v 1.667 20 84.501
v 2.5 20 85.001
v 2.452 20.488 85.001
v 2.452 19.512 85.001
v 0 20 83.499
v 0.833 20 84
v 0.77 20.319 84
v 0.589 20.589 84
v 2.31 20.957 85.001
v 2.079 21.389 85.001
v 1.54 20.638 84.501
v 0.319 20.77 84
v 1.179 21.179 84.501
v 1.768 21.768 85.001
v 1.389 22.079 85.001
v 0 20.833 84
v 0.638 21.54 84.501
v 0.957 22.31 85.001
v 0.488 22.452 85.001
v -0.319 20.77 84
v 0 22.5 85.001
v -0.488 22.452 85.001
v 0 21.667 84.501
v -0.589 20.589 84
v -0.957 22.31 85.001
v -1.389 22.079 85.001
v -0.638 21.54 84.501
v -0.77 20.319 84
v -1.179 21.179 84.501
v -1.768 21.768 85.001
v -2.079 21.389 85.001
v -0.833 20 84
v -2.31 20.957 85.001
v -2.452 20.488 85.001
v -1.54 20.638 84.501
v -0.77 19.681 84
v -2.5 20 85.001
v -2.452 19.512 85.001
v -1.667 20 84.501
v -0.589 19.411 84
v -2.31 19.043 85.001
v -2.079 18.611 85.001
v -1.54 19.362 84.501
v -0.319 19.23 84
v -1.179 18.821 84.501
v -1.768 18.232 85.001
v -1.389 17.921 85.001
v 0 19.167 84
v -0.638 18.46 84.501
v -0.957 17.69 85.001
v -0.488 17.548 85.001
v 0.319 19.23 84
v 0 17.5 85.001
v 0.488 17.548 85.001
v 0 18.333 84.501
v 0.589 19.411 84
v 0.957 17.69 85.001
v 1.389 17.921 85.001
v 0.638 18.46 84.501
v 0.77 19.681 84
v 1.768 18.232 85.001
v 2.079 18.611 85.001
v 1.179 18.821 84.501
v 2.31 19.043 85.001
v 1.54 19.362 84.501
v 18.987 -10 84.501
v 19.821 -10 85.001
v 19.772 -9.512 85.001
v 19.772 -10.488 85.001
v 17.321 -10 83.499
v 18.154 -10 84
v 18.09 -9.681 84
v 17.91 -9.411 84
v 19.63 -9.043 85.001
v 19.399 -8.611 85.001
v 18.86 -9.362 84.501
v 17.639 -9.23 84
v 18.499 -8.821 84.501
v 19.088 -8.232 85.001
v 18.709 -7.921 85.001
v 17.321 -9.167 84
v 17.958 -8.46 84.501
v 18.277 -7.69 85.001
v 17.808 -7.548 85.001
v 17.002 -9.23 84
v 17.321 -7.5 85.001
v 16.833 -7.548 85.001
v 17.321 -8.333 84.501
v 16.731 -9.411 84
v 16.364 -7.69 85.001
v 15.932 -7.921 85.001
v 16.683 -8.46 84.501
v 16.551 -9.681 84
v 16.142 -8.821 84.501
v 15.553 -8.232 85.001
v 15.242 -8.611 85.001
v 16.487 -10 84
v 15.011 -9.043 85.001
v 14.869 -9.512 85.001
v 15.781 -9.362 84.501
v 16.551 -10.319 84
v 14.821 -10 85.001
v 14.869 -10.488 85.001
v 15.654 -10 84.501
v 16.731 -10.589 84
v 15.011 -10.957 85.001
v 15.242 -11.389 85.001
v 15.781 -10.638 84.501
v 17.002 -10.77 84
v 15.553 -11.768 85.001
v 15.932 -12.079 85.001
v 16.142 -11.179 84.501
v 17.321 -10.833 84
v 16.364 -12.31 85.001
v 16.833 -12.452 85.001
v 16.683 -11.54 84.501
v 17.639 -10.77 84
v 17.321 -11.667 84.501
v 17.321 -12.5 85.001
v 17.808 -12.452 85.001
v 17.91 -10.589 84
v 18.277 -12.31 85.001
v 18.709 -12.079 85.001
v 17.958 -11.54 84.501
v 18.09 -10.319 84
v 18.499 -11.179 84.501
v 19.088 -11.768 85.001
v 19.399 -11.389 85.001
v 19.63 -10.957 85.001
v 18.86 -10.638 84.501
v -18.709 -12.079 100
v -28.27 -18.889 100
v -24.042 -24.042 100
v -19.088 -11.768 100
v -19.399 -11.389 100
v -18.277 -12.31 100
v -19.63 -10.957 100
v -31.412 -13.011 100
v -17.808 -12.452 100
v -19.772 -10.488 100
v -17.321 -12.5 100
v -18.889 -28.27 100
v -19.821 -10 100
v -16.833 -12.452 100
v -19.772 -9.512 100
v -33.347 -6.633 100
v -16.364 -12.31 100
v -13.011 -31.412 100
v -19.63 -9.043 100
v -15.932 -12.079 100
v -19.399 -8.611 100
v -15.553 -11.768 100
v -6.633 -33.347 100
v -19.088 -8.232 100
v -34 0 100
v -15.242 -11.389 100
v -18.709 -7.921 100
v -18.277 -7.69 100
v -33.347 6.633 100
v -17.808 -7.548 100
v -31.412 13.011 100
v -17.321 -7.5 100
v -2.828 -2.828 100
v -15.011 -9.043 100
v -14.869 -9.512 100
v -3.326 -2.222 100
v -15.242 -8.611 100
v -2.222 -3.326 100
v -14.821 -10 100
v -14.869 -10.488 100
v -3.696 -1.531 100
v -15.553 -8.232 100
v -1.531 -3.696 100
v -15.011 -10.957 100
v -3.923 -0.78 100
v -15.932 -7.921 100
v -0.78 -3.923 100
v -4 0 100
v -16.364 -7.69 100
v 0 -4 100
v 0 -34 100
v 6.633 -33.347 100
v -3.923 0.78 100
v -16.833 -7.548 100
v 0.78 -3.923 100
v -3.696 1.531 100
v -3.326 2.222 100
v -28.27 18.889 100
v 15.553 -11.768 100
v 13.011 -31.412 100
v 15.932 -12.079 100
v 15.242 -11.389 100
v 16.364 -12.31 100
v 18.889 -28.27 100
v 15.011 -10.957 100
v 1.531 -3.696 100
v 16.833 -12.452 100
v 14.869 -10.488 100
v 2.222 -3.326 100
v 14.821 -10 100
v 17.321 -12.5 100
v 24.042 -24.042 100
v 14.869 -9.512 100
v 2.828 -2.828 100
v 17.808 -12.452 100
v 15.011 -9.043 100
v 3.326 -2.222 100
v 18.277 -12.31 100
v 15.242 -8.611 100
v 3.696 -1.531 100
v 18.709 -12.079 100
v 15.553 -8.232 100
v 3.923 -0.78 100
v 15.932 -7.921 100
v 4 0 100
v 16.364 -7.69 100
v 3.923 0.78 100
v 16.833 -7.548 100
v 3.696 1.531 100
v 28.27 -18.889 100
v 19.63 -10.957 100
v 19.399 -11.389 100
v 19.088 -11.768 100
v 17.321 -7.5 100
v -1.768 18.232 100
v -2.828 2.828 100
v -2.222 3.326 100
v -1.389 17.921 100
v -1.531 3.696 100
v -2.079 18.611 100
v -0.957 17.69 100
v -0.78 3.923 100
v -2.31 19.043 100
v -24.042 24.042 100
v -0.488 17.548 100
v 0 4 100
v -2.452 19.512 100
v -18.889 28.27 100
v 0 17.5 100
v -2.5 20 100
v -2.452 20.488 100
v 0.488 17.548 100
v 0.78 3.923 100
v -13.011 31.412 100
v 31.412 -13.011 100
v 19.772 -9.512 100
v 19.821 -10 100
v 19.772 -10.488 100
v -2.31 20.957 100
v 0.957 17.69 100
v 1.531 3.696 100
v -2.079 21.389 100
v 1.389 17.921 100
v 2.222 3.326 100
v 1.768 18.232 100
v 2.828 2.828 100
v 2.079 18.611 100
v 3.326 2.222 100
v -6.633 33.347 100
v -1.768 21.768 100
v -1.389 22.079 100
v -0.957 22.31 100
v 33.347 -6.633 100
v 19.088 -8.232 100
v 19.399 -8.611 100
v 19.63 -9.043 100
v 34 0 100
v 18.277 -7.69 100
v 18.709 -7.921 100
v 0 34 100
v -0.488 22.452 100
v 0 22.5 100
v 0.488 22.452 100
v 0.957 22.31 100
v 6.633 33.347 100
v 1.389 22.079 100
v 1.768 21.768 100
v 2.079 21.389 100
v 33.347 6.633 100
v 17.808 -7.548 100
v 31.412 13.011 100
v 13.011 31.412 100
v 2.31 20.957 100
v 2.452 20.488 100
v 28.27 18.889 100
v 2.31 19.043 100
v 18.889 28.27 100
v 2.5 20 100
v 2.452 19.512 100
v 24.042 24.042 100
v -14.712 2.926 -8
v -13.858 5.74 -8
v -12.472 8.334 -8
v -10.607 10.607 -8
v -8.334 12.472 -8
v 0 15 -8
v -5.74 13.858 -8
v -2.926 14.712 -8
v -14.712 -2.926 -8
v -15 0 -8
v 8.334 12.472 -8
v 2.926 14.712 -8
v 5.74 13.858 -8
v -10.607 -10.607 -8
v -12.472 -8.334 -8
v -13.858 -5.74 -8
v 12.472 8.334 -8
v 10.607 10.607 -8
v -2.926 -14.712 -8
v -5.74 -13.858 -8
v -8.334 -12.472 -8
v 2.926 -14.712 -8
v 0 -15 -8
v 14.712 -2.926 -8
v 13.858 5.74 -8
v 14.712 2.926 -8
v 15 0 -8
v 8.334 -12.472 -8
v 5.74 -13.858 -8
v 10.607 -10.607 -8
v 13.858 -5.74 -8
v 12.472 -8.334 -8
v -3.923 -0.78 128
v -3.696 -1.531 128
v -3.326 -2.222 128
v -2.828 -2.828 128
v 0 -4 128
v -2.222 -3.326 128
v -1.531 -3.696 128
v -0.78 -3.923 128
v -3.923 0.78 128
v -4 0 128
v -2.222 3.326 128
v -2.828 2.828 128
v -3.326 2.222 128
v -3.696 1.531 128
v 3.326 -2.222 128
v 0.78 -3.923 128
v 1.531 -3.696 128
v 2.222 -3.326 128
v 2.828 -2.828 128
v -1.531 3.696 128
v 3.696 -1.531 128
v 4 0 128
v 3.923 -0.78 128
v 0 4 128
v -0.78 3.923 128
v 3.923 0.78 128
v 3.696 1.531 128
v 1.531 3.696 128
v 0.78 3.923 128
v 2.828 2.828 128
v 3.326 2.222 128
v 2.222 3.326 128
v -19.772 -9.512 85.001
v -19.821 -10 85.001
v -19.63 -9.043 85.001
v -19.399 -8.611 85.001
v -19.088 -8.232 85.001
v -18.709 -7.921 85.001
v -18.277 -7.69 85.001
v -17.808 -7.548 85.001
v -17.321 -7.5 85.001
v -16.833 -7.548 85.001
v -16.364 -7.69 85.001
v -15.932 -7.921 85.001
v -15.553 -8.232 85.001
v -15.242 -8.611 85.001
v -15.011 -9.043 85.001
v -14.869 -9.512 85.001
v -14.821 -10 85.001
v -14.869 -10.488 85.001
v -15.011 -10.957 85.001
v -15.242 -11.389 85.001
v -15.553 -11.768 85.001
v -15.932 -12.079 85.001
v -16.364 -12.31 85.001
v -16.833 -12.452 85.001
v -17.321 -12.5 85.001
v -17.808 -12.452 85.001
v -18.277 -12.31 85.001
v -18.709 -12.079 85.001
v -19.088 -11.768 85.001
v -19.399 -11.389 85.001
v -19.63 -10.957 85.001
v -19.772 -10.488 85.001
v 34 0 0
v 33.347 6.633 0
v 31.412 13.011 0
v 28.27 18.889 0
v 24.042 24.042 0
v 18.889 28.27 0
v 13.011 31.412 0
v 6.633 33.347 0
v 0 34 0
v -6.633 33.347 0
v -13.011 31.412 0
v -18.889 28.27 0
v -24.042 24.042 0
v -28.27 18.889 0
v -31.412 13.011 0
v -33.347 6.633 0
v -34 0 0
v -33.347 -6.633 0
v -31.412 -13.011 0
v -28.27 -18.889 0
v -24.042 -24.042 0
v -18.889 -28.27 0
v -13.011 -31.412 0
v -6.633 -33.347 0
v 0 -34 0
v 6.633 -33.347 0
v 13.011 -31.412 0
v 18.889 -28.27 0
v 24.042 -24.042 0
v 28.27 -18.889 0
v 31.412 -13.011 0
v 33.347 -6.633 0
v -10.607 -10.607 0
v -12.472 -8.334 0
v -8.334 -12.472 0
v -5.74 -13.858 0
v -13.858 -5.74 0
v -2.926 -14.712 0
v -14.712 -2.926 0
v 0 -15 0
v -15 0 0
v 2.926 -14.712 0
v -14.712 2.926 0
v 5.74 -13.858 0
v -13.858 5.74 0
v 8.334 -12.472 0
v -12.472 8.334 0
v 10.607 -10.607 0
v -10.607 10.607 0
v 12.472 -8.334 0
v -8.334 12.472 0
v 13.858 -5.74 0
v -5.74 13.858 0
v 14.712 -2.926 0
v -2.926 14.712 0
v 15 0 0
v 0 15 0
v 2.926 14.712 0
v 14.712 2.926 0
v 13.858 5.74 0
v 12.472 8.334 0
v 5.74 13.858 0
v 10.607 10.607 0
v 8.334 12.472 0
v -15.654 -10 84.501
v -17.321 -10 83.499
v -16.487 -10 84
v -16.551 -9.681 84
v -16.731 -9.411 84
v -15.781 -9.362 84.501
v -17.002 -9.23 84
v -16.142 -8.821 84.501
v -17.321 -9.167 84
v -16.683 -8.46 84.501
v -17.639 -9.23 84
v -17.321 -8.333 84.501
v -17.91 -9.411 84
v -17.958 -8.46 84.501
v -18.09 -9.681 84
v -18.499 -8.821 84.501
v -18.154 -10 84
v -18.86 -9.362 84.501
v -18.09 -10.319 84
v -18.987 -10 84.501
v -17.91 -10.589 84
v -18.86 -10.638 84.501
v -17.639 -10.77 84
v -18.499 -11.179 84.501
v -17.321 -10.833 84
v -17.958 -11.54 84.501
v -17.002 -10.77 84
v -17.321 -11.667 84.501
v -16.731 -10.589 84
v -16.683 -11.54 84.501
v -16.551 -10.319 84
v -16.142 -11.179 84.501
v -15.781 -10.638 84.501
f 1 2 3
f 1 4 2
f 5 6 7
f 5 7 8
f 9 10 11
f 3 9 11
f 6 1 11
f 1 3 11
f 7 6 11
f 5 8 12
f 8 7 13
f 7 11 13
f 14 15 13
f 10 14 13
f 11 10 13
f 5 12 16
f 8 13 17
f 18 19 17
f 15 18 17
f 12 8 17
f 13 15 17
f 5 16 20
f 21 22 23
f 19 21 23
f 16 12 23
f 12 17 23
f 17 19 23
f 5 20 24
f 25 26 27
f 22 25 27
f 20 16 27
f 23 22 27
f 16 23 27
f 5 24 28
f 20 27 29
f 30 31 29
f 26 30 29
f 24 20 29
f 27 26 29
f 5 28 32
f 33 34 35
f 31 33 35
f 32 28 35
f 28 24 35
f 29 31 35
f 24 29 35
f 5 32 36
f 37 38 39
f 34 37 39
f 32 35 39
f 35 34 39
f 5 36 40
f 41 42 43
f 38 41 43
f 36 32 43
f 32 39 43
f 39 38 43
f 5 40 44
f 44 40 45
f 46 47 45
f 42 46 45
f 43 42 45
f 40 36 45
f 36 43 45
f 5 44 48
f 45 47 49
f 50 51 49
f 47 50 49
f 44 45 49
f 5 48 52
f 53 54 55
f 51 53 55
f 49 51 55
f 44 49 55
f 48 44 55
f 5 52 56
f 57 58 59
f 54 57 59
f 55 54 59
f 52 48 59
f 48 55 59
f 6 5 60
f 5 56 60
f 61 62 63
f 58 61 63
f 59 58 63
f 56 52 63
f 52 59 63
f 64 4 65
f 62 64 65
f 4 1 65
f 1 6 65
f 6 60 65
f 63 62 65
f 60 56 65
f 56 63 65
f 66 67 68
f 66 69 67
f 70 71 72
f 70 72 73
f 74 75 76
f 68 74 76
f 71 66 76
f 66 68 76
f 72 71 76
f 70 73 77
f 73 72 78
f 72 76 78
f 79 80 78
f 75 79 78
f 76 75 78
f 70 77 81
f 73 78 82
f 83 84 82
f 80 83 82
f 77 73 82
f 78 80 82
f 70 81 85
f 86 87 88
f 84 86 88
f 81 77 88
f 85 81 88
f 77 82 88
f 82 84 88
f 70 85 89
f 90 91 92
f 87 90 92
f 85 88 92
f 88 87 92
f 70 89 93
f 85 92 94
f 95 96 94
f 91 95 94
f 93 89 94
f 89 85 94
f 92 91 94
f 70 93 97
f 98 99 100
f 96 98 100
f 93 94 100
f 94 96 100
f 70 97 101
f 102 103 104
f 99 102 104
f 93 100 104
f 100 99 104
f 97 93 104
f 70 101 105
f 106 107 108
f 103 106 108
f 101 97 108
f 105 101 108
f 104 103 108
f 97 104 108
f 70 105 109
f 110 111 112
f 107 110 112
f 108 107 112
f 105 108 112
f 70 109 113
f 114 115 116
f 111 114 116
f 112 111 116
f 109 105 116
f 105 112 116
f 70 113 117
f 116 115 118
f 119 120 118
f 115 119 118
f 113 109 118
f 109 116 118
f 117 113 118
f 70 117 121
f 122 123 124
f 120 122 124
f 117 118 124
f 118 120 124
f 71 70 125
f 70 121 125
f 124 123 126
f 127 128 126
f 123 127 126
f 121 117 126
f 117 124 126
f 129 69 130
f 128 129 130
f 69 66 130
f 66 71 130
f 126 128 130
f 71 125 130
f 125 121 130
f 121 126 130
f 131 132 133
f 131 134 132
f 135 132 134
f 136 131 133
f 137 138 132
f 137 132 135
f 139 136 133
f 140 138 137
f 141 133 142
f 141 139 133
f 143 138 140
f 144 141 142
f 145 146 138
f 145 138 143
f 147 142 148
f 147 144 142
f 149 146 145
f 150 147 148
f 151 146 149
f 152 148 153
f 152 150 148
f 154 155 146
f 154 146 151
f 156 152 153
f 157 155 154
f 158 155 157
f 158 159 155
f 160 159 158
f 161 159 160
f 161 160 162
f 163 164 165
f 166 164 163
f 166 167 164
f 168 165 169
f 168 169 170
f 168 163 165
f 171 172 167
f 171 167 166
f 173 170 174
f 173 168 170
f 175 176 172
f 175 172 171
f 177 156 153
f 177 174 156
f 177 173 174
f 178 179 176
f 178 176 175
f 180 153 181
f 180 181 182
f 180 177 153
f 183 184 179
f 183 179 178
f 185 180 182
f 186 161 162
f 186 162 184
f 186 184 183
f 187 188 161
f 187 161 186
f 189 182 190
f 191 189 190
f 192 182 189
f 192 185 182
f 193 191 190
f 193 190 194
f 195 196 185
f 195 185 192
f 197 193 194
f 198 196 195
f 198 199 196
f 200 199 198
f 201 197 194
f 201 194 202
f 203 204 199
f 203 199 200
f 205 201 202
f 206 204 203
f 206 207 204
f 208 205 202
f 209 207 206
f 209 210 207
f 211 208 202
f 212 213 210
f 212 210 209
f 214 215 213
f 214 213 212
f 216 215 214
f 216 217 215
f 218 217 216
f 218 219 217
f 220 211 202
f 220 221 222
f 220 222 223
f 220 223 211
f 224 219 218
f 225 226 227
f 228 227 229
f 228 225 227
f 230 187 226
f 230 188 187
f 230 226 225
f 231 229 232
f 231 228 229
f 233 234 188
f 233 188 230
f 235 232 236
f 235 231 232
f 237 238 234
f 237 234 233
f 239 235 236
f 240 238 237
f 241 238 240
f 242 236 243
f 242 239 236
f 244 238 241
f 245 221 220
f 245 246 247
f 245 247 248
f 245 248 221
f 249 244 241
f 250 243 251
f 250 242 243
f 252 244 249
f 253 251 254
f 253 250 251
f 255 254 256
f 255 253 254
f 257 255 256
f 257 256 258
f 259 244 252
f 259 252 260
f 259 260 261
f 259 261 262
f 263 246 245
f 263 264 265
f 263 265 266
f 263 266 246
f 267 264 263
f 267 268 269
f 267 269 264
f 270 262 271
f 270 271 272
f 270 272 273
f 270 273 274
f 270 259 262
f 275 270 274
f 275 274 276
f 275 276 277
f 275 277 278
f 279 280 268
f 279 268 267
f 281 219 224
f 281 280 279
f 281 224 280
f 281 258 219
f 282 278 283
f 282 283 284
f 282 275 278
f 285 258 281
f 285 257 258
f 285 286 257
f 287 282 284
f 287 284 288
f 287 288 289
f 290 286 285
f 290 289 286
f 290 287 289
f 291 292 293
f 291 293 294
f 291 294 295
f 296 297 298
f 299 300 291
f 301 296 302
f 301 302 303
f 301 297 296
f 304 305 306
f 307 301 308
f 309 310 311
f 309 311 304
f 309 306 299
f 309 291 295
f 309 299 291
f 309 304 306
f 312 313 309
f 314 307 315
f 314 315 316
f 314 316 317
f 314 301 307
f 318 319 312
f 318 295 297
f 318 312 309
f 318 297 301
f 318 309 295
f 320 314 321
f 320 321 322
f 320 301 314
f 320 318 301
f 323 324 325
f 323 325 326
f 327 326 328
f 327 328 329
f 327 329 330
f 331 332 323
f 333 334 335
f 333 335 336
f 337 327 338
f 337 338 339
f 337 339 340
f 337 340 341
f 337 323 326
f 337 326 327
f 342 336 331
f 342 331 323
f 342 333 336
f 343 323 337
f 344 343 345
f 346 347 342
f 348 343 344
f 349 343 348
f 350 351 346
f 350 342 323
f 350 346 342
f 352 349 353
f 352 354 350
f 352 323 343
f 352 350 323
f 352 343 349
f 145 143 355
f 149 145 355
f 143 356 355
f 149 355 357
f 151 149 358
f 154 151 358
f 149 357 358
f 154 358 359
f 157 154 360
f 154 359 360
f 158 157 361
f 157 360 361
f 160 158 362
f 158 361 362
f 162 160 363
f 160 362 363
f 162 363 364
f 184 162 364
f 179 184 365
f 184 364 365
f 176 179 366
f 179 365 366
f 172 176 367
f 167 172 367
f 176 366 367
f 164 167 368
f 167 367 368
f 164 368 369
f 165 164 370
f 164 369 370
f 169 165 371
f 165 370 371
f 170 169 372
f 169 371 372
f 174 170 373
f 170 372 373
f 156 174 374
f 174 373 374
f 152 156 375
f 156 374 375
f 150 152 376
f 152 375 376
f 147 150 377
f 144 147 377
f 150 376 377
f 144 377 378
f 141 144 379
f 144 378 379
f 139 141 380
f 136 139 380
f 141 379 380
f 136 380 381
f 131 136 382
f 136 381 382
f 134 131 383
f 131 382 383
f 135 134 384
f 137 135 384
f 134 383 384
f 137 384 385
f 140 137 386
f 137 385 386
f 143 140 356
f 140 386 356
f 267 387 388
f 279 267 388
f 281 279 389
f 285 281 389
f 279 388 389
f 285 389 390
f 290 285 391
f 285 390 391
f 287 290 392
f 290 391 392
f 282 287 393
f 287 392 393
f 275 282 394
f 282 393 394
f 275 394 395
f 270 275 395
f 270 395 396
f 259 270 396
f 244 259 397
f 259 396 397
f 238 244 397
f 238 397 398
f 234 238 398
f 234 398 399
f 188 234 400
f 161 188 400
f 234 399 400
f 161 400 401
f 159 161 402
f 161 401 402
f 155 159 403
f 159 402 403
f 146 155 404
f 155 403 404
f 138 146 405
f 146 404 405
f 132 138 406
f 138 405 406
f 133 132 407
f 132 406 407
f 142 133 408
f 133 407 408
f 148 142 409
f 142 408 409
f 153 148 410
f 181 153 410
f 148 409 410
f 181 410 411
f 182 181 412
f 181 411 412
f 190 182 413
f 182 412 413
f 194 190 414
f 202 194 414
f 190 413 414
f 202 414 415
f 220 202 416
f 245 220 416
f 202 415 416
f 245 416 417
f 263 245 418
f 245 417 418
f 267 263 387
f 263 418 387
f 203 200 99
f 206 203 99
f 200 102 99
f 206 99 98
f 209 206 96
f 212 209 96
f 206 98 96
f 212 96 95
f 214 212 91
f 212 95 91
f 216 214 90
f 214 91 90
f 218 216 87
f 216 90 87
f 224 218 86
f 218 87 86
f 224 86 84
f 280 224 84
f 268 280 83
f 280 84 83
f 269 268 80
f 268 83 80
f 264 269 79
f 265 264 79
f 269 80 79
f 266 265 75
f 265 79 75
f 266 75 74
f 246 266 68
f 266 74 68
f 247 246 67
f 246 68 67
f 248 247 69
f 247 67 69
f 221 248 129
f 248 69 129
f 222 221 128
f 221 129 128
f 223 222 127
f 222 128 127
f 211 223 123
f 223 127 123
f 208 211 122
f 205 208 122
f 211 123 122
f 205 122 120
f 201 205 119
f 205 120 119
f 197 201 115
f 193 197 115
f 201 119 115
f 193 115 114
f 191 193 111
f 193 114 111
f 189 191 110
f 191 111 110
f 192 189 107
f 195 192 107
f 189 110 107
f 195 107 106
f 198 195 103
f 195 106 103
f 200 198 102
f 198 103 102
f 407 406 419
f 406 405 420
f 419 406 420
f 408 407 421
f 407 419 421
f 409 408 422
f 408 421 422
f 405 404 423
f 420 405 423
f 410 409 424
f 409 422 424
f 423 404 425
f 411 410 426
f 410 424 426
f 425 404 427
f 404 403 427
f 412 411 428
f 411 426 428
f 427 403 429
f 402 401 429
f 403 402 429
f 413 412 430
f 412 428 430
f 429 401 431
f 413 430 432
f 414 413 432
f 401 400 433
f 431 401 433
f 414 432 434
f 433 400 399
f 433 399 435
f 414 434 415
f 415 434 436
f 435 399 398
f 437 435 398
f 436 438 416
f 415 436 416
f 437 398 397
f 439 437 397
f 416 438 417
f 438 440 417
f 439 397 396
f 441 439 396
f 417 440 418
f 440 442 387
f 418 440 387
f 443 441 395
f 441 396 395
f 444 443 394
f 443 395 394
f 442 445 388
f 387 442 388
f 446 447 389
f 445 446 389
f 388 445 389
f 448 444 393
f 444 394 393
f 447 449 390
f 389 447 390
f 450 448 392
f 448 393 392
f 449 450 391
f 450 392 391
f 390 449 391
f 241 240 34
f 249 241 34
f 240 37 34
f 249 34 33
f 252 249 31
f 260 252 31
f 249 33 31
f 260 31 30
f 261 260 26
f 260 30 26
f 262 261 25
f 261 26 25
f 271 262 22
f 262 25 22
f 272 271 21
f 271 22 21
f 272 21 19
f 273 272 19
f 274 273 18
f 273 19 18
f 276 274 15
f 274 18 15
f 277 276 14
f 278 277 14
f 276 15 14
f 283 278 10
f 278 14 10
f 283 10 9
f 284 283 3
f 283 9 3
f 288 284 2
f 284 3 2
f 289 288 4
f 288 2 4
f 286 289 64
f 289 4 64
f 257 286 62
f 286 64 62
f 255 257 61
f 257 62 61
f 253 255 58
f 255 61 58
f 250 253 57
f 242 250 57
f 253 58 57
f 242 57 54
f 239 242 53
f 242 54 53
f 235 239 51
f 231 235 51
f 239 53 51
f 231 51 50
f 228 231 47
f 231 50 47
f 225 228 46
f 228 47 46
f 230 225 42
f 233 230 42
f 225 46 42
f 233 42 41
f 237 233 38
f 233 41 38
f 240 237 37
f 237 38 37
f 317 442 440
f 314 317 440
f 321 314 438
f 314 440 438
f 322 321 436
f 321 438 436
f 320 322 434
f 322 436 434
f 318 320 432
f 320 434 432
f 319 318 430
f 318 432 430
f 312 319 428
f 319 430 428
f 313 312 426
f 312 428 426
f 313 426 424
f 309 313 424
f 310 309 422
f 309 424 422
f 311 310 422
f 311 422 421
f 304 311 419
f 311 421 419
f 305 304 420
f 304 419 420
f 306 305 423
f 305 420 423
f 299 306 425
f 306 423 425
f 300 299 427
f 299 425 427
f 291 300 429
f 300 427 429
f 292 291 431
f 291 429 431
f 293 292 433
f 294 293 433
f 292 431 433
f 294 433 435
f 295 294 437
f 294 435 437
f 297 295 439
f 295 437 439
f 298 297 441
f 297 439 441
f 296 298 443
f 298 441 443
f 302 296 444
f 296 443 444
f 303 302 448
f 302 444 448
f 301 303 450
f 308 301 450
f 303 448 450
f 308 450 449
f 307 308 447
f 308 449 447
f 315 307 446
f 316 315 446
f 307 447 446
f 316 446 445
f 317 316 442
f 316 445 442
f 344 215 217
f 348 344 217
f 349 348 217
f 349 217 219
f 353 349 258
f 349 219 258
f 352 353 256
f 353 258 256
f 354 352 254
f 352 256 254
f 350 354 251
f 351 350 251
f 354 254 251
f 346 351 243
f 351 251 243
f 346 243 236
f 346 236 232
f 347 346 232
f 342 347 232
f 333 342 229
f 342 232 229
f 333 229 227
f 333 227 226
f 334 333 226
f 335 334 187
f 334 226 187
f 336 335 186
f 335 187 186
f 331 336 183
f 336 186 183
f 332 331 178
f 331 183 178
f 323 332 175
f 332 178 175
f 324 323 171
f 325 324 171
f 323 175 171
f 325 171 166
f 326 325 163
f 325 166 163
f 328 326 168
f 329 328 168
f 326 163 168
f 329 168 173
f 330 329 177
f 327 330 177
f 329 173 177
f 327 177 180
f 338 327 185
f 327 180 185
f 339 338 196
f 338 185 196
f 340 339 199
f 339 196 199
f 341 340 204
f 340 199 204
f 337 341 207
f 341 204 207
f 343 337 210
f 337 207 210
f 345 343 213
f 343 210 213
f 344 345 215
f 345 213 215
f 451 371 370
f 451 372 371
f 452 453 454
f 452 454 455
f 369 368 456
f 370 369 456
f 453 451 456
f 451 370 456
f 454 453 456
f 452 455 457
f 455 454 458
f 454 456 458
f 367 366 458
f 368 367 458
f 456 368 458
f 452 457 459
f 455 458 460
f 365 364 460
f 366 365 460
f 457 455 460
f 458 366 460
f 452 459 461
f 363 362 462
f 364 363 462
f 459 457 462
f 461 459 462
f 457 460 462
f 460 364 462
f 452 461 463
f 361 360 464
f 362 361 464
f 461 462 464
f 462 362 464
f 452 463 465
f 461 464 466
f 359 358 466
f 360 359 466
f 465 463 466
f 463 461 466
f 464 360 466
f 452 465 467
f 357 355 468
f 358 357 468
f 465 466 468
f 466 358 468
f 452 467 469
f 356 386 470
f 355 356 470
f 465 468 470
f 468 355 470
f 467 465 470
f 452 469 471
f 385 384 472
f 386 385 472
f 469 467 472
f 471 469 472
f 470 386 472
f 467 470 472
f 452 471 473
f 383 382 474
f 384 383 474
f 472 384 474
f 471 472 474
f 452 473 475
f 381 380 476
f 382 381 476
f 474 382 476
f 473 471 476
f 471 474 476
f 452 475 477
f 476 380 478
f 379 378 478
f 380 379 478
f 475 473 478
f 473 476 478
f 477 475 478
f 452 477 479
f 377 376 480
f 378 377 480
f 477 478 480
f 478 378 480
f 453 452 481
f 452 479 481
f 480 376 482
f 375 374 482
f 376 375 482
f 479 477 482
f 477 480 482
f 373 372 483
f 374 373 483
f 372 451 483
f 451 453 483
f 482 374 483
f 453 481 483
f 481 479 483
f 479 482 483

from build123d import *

# Parameters (mm, degrees)
SKETCH1_R                 = 34
BOSS_EXTRUDE1_DEPTH       = 100
SKETCH3_R                 = 4
BOSS_EXTRUDE2_DEPTH       = 28
M6X1_0_TAPPED_HOLE1_D     = 5
M6X1_0_TAPPED_HOLE1_DEPTH = 14.9987
M6X1_0_TAPPED_HOLE1_TIP   = 1.502151548
SKETCH6_R                 = 15
BOSS_EXTRUDE3_DEPTH       = 8


with BuildPart() as part:
    # Sketch1 → Boss-Extrude1 (new body)
    with BuildSketch(Plane.XY):
        Circle(SKETCH1_R)
    extrude(amount=BOSS_EXTRUDE1_DEPTH)

    # Sketch3 → Boss-Extrude2 (add)
    with BuildSketch(Plane.XY.offset(100)):
        Circle(SKETCH3_R)
    extrude(amount=BOSS_EXTRUDE2_DEPTH)

    # M6x1.0 Tapped Hole1
    with Locations(Plane(origin=(0, 20, 100), x_dir=(1, 0, 0), z_dir=(0, 0, 1))):
        with Locations((0, 0), (17.320508076, -30), (-17.320508076, -30)):
            Hole(M6X1_0_TAPPED_HOLE1_D / 2, depth=M6X1_0_TAPPED_HOLE1_DEPTH)
            with Locations((0, 0, -(M6X1_0_TAPPED_HOLE1_DEPTH + M6X1_0_TAPPED_HOLE1_TIP / 2))):  # 118° drill point
                Cone(0, M6X1_0_TAPPED_HOLE1_D / 2, M6X1_0_TAPPED_HOLE1_TIP, mode=Mode.SUBTRACT)

    # Sketch6 → Boss-Extrude3 (add)
    with BuildSketch(Plane(origin=(0, 0, 0), x_dir=(-1, 0, 0), z_dir=(0, 0, -1))):
        with Locations(Location((0, 0, 0), (0, 0, 180))):
            Circle(SKETCH6_R)
    extrude(amount=BOSS_EXTRUDE3_DEPTH)


solid = part.part
